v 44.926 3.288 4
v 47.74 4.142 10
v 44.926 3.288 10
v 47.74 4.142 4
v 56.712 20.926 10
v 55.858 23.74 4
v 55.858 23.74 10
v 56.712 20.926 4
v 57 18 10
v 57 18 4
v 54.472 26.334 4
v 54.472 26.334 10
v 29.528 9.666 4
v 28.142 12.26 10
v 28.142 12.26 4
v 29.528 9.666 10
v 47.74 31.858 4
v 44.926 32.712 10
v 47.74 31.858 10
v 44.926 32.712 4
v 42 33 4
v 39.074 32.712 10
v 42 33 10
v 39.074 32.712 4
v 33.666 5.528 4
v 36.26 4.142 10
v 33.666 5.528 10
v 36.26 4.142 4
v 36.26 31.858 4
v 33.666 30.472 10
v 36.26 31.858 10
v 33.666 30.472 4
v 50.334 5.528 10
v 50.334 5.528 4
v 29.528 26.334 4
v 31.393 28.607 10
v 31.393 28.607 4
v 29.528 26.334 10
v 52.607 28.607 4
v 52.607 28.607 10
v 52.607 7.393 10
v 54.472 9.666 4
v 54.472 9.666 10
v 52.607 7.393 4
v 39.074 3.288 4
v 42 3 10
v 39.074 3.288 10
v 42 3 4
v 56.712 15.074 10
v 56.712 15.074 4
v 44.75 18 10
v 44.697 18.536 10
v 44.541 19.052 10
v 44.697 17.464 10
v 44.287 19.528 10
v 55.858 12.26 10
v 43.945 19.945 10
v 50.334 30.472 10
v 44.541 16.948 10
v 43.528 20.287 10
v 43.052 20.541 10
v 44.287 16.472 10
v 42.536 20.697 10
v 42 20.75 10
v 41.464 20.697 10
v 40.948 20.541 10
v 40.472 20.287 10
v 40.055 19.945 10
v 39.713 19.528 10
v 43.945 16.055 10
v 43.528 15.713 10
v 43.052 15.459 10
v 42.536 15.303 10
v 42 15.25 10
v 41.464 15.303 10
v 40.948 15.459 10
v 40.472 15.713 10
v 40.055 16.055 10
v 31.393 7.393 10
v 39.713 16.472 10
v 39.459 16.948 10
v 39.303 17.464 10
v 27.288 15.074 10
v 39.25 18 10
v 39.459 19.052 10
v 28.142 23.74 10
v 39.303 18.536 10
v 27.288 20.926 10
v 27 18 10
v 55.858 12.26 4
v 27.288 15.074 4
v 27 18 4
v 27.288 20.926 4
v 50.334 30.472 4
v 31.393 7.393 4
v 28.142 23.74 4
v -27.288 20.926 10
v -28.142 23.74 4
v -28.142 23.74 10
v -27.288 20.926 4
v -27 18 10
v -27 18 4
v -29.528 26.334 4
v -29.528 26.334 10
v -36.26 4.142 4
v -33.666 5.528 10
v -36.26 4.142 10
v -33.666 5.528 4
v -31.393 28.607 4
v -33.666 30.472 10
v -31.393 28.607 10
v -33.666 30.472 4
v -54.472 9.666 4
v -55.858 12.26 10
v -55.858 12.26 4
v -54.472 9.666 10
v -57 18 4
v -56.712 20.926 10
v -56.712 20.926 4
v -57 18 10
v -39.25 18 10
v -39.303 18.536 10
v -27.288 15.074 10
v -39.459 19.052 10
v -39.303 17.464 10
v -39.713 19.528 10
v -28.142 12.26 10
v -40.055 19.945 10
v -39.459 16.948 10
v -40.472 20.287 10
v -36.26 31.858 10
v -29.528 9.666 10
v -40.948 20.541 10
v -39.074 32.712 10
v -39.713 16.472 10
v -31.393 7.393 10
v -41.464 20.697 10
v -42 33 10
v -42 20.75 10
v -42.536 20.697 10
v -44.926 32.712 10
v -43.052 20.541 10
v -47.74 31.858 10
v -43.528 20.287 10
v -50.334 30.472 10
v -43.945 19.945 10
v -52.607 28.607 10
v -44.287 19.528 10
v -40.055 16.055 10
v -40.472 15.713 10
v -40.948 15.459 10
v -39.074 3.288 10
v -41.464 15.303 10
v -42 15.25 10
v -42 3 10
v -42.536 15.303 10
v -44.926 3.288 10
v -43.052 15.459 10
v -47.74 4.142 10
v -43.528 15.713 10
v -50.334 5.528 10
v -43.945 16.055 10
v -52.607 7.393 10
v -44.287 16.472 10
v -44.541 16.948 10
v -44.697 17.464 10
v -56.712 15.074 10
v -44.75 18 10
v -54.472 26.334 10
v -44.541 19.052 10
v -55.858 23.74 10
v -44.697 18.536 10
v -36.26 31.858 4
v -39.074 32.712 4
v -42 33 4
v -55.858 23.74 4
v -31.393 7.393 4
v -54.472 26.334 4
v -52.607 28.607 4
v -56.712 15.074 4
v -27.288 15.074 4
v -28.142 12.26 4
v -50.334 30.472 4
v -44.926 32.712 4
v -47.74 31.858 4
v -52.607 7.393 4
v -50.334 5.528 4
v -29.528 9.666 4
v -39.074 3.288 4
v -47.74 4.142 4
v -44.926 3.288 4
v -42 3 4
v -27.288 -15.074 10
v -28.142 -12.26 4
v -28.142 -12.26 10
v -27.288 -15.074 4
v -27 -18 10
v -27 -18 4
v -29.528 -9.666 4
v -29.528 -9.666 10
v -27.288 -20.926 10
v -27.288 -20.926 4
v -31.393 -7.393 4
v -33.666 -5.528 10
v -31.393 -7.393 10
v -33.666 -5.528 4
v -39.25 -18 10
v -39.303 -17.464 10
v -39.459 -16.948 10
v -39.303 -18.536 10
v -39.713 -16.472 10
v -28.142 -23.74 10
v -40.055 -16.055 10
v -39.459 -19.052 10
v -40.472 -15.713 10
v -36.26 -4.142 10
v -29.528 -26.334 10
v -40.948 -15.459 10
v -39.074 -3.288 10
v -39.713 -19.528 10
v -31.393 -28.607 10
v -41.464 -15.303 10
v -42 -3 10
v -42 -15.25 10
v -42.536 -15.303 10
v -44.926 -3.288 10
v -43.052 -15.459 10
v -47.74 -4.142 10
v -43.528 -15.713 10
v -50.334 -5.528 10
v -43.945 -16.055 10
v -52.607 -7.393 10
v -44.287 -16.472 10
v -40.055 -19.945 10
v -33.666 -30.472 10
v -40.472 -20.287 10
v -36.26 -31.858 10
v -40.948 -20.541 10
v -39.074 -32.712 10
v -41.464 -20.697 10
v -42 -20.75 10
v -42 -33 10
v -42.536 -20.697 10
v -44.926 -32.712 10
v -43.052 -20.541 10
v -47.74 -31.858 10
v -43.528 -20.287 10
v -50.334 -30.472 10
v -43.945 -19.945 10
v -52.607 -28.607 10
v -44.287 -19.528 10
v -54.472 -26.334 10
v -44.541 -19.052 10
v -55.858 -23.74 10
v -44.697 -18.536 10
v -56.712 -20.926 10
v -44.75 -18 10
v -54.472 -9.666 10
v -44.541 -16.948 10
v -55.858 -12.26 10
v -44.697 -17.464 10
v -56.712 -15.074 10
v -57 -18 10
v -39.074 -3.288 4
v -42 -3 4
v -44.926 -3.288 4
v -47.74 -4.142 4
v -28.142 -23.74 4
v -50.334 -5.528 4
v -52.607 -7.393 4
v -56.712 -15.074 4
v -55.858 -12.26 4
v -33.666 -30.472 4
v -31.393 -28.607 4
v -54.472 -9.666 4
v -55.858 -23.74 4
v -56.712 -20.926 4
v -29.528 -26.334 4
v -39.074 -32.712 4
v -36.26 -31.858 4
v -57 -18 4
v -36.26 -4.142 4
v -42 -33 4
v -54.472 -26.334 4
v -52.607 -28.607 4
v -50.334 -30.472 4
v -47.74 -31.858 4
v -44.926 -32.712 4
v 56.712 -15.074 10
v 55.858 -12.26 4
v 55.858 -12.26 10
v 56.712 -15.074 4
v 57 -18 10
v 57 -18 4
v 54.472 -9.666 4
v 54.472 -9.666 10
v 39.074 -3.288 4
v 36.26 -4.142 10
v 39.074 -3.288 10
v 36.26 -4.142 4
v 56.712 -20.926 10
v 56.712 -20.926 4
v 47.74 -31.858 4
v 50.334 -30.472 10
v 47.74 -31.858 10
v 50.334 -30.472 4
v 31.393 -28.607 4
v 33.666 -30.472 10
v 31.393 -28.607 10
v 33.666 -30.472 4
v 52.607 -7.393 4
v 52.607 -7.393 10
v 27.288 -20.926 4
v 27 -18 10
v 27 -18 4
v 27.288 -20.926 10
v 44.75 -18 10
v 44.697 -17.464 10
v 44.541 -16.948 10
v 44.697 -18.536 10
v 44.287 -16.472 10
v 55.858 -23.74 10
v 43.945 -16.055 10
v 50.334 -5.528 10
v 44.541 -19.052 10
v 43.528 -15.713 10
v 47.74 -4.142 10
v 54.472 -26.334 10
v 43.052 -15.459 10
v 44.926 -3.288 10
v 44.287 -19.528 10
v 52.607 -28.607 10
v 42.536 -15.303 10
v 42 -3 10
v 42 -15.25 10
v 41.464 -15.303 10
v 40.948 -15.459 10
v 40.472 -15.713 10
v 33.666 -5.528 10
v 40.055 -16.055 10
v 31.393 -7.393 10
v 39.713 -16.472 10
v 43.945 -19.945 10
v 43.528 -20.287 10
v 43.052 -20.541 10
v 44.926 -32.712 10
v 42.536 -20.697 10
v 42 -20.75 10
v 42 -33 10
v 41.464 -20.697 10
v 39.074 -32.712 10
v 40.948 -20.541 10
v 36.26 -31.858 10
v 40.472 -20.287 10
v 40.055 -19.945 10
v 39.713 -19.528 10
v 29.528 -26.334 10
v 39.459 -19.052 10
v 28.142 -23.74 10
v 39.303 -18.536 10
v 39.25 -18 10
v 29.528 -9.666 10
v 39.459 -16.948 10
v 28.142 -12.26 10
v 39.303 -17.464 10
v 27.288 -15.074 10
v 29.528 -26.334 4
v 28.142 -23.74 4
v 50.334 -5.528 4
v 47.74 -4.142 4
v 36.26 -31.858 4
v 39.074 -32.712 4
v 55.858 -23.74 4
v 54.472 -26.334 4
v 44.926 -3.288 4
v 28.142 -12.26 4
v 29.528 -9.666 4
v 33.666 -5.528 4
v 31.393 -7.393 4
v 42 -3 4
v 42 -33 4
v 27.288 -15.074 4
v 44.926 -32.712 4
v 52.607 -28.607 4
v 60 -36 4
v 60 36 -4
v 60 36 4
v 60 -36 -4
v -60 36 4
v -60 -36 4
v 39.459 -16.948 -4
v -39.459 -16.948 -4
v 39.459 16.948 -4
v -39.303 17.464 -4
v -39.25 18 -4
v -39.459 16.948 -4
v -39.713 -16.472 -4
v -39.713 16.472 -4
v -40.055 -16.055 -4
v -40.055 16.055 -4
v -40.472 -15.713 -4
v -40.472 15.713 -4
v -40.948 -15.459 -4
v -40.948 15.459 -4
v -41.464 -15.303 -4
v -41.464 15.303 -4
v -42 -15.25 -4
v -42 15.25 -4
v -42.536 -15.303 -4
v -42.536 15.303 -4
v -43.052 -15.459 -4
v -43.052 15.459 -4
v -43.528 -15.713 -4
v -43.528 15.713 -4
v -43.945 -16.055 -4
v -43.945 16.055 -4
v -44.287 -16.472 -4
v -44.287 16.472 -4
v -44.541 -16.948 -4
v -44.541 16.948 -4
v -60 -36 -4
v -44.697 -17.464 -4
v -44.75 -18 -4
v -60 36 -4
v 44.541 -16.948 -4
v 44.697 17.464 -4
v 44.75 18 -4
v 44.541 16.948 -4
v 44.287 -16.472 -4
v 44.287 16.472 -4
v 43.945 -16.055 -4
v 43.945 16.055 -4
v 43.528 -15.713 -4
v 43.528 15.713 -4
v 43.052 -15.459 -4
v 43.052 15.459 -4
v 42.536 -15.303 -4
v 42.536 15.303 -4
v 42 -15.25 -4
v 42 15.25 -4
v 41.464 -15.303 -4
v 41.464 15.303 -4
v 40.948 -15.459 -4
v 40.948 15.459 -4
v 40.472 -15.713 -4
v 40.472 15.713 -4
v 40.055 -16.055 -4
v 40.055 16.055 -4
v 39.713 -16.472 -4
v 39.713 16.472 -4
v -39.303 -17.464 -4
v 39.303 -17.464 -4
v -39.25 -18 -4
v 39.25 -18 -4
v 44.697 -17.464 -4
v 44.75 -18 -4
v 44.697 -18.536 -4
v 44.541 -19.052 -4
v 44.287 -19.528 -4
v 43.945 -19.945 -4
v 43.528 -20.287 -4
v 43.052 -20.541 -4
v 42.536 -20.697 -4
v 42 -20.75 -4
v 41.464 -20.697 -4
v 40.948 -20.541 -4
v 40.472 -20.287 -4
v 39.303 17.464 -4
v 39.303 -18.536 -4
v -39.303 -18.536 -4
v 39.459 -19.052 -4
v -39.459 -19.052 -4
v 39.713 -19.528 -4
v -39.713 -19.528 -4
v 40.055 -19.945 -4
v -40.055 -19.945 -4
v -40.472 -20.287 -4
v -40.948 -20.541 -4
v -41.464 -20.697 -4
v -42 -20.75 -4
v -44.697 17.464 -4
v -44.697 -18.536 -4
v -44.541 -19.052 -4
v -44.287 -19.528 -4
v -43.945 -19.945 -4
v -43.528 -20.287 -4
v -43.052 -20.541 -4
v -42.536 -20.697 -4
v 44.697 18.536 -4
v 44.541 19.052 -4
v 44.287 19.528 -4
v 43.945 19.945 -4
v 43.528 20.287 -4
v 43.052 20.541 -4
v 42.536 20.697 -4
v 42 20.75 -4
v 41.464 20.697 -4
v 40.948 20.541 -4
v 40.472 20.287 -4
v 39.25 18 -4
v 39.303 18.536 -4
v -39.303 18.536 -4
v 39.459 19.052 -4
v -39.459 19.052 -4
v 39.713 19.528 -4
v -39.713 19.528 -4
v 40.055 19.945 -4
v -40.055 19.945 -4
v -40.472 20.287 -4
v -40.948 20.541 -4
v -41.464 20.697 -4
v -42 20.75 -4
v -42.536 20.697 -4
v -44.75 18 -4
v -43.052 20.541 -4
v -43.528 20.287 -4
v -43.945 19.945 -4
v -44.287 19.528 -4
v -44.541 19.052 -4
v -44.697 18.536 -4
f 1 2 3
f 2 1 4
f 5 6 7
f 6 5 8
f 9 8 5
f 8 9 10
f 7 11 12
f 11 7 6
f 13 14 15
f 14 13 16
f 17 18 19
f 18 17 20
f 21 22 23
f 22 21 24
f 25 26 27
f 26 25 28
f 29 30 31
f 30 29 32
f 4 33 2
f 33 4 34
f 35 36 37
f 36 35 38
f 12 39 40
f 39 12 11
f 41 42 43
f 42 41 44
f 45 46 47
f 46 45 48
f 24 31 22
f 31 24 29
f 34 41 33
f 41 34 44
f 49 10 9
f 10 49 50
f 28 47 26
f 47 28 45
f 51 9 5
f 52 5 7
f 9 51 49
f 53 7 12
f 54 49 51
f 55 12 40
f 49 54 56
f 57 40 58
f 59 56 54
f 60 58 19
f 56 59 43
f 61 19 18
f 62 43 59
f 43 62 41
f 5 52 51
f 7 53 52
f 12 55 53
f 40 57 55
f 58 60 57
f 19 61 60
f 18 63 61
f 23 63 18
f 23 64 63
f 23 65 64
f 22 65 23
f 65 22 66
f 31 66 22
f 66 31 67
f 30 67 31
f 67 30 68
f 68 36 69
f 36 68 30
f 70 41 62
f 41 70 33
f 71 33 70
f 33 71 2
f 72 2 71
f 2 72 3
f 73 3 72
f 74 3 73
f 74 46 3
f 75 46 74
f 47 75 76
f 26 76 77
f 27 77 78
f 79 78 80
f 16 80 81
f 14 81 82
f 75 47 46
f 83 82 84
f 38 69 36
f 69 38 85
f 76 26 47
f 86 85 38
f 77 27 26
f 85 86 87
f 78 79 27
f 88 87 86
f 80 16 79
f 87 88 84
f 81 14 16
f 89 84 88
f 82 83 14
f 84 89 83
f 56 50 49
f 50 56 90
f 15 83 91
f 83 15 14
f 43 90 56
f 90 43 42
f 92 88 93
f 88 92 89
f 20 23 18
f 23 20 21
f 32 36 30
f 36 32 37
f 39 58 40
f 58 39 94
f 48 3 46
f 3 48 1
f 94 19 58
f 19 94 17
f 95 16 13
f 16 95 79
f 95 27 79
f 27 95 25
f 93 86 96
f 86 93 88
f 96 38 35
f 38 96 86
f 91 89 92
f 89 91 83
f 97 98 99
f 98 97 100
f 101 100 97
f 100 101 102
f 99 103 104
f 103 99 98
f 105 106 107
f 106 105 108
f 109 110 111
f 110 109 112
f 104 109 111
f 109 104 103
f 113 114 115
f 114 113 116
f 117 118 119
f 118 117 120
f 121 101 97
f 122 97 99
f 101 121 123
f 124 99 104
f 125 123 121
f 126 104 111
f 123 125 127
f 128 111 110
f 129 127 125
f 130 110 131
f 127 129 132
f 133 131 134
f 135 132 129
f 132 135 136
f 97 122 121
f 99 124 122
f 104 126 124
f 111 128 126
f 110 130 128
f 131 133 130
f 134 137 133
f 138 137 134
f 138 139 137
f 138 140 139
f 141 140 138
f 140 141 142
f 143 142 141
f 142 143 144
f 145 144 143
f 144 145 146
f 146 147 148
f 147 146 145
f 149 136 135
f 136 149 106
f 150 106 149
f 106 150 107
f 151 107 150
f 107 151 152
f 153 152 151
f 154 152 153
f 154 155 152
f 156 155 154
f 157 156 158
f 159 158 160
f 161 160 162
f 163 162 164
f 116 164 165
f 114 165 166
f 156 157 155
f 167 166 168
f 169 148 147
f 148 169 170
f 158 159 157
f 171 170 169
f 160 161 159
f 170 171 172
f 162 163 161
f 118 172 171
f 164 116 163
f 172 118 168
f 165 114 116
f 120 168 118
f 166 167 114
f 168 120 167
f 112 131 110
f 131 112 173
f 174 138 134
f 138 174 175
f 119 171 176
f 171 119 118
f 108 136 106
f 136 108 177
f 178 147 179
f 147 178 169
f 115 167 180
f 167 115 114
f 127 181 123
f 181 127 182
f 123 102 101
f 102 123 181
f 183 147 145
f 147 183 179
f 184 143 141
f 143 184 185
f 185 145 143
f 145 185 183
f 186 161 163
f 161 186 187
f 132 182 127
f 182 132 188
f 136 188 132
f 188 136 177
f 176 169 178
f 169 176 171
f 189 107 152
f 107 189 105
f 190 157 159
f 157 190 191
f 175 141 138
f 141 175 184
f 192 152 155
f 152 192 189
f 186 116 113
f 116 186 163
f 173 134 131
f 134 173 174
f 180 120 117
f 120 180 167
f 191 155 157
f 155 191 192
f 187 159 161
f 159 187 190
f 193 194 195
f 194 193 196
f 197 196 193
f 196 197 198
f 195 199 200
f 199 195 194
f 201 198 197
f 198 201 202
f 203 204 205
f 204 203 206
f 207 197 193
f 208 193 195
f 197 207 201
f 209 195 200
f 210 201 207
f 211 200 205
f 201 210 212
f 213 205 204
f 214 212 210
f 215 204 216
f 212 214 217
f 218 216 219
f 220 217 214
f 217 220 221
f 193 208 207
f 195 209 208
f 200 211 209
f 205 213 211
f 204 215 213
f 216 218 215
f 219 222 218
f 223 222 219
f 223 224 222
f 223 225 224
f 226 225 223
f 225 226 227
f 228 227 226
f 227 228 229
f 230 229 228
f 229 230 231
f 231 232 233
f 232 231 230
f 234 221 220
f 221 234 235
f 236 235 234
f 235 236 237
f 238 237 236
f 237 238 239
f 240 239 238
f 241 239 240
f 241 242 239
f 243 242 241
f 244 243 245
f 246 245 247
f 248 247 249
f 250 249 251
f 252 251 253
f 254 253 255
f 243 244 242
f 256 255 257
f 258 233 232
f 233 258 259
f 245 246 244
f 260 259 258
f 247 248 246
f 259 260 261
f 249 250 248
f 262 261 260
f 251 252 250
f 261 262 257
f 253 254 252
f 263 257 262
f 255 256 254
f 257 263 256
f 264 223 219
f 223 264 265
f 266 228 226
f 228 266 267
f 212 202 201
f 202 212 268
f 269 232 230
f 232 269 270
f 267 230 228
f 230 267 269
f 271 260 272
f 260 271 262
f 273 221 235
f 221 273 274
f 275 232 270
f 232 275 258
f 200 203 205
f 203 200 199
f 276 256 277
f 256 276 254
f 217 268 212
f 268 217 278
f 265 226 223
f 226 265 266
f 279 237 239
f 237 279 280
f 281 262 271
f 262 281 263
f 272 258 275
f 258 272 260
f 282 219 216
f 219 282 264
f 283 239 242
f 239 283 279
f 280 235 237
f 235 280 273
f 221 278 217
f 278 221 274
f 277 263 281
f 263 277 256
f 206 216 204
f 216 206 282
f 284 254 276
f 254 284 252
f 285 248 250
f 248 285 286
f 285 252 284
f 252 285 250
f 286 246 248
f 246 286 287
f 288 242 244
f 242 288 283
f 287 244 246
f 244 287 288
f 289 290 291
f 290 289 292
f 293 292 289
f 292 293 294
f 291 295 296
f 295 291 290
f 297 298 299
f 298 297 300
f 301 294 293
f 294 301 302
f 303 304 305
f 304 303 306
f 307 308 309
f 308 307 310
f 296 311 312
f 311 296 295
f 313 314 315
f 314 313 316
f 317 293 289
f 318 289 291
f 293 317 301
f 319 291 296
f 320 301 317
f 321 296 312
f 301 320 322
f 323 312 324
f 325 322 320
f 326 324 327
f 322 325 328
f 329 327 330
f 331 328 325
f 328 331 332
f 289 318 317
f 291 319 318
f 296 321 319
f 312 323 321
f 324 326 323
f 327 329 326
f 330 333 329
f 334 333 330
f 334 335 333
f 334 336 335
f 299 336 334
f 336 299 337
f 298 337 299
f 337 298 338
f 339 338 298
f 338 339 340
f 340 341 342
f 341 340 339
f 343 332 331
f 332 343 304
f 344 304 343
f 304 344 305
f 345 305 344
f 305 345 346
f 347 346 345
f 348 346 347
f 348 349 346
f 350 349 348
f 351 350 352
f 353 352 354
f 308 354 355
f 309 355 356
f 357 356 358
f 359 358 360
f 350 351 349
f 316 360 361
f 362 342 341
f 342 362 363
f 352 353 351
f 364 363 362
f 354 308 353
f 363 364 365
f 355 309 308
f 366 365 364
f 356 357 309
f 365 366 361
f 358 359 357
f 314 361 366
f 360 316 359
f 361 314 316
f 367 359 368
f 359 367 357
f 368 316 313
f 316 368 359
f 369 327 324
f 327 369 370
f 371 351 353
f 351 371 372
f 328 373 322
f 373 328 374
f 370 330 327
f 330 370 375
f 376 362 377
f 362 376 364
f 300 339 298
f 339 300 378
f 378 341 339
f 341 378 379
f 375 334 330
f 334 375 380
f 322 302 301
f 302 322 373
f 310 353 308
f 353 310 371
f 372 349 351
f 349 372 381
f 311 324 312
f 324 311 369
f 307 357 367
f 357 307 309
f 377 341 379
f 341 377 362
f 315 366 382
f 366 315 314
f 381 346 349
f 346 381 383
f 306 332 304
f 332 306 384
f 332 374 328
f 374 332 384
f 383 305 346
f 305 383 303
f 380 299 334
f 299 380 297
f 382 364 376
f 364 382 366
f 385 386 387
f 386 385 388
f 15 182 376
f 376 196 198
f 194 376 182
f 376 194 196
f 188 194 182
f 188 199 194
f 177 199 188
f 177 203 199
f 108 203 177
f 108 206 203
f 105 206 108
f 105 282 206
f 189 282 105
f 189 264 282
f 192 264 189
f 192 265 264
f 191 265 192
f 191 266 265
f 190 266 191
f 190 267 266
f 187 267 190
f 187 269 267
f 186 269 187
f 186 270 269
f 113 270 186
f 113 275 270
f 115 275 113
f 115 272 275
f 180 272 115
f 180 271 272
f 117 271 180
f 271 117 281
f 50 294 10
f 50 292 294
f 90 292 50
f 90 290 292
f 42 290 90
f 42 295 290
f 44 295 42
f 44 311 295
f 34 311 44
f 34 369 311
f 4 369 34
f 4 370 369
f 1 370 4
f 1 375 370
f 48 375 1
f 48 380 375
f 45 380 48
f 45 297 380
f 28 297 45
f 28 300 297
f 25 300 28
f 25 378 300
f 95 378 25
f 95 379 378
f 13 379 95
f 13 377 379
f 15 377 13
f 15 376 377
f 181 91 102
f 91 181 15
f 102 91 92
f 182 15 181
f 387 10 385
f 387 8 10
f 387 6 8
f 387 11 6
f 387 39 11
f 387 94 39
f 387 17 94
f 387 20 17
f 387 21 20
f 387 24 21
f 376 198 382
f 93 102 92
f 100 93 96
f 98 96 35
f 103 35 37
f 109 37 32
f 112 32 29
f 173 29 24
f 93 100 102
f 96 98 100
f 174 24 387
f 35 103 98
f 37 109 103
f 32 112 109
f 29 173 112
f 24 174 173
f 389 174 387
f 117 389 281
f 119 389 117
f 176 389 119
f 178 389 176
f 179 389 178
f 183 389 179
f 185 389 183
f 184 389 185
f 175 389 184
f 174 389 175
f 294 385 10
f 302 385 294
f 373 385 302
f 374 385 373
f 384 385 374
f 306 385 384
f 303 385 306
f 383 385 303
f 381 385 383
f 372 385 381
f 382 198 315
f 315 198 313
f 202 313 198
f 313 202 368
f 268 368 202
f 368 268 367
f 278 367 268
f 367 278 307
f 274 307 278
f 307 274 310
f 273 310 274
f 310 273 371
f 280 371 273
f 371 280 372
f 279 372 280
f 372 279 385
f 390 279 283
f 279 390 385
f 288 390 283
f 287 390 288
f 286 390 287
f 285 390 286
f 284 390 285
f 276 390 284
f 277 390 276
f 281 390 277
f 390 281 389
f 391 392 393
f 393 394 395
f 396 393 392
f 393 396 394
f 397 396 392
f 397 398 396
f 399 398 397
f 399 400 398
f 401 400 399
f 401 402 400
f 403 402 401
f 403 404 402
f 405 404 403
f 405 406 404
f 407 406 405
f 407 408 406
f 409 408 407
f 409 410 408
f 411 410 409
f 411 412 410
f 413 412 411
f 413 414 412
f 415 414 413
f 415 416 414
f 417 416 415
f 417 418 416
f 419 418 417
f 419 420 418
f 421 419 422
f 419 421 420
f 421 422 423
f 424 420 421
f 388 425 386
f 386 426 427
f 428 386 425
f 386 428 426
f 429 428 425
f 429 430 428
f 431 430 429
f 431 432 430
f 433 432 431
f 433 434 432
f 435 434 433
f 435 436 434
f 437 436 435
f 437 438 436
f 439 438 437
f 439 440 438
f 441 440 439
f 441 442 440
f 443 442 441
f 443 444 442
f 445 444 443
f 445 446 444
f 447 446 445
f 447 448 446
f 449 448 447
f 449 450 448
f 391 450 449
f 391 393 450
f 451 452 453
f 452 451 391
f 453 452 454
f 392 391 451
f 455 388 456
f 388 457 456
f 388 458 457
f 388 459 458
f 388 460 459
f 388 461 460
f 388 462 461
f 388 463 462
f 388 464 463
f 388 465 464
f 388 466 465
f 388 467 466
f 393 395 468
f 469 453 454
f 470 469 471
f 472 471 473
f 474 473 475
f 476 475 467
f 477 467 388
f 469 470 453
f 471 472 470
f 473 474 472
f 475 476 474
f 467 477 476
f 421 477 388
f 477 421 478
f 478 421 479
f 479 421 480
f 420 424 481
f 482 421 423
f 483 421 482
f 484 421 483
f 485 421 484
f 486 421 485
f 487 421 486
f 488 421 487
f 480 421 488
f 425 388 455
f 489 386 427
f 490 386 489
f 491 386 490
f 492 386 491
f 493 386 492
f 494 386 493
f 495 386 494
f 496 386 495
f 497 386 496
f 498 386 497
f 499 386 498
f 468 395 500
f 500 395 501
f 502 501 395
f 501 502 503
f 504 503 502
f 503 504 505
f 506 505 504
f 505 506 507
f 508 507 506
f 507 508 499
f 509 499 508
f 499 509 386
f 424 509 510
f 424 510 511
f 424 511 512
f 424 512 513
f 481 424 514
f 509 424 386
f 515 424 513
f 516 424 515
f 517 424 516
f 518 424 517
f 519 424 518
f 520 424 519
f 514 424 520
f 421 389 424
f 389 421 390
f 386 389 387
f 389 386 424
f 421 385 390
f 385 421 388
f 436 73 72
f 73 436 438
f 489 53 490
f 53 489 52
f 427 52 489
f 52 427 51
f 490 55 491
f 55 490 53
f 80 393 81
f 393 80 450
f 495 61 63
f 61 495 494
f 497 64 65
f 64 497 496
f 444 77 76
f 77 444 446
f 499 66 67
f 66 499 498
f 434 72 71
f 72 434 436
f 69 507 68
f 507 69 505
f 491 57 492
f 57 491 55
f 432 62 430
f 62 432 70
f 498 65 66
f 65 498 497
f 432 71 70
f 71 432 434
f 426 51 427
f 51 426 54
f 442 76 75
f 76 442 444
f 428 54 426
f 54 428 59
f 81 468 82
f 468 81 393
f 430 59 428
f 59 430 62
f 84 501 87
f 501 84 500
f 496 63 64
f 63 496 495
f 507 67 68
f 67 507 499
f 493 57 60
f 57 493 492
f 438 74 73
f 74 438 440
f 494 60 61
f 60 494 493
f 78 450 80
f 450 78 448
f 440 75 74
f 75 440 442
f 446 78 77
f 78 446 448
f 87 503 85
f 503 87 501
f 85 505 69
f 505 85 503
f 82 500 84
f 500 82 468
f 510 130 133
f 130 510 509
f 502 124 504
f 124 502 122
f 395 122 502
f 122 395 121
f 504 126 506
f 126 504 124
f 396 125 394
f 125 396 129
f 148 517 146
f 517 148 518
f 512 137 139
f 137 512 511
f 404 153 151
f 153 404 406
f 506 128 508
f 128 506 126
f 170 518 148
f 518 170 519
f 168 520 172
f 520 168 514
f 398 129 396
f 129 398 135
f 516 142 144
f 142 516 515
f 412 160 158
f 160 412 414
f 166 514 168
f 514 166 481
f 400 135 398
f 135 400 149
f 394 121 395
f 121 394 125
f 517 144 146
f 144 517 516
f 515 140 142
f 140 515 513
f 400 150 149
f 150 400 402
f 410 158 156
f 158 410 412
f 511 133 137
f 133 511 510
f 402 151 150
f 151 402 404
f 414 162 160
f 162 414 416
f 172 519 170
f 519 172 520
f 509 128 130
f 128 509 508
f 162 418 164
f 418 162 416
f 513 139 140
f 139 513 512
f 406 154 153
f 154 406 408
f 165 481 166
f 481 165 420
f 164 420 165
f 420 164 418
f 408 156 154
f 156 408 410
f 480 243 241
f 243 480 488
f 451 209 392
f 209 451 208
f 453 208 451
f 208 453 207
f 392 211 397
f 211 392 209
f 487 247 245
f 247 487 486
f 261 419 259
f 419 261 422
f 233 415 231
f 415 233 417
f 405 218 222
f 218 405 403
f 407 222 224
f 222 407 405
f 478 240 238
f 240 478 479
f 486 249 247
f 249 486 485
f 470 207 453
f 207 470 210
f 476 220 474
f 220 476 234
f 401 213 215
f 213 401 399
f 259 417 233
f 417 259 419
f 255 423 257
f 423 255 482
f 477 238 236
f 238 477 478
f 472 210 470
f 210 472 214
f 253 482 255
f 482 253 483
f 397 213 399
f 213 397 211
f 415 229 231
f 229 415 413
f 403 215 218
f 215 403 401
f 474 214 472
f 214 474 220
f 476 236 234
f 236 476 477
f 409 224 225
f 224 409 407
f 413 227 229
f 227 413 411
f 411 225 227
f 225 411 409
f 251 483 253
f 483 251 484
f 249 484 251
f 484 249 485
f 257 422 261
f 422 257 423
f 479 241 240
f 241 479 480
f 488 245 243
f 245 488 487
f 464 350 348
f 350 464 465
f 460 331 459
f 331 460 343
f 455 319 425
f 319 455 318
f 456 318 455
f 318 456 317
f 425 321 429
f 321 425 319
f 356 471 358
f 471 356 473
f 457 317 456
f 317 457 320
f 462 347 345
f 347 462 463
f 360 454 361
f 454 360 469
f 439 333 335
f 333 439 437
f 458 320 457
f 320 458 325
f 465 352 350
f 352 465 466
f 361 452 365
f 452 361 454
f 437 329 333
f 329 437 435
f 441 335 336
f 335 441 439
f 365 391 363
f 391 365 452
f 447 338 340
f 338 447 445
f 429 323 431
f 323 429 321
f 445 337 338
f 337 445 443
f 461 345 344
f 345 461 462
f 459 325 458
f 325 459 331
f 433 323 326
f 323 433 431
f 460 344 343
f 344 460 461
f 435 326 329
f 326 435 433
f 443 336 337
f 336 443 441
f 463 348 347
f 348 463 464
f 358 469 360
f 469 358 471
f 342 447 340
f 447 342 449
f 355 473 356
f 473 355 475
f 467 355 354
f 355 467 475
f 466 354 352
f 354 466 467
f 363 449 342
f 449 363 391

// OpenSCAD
$fn = 32;

// ----------------------------------------------------------------------
// Anchor pads 120 x 72 x 14
// four corner bosses with anchor holes
// ----------------------------------------------------------------------

// --- parameters (mm) ---
plate = [120, 72, 8];  // base plate size (x, y, z)
pads = 4;              // boss count, one per corner
edge = 18;             // boss centre offset from the plate edge
boss_d = 30;           // boss diameter
boss_h = 6;            // boss height above the base plate
hole_d = 5.5;          // hole diameter

// --- derived feature positions (mm) ---
height = plate[2] + boss_h;      // = 14   overall height of the part
corner_x = plate[0] / 2 - edge;  // = 42   boss centre X
corner_y = plate[1] / 2 - edge;  // = 18   boss centre Y
feature_centers = [
  [corner_x, corner_y],
  [-corner_x, corner_y],
  [-corner_x, -corner_y],
  [corner_x, -corner_y]
];   // boss centres, anchor holes are drilled there

// base plate, four bosses standing on it, anchor holes all the way through
difference() {
  union() {
    cube(plate, center = true);
    for (centre = feature_centers)
      translate([centre[0], centre[1], plate[2] / 2 - 1])
        cylinder(d = boss_d, h = boss_h + 1);
  }
  for (centre = feature_centers)
    translate([centre[0], centre[1], -height])
      cylinder(d = hole_d, h = 2 * height + 2);  // through boss and plate
}
